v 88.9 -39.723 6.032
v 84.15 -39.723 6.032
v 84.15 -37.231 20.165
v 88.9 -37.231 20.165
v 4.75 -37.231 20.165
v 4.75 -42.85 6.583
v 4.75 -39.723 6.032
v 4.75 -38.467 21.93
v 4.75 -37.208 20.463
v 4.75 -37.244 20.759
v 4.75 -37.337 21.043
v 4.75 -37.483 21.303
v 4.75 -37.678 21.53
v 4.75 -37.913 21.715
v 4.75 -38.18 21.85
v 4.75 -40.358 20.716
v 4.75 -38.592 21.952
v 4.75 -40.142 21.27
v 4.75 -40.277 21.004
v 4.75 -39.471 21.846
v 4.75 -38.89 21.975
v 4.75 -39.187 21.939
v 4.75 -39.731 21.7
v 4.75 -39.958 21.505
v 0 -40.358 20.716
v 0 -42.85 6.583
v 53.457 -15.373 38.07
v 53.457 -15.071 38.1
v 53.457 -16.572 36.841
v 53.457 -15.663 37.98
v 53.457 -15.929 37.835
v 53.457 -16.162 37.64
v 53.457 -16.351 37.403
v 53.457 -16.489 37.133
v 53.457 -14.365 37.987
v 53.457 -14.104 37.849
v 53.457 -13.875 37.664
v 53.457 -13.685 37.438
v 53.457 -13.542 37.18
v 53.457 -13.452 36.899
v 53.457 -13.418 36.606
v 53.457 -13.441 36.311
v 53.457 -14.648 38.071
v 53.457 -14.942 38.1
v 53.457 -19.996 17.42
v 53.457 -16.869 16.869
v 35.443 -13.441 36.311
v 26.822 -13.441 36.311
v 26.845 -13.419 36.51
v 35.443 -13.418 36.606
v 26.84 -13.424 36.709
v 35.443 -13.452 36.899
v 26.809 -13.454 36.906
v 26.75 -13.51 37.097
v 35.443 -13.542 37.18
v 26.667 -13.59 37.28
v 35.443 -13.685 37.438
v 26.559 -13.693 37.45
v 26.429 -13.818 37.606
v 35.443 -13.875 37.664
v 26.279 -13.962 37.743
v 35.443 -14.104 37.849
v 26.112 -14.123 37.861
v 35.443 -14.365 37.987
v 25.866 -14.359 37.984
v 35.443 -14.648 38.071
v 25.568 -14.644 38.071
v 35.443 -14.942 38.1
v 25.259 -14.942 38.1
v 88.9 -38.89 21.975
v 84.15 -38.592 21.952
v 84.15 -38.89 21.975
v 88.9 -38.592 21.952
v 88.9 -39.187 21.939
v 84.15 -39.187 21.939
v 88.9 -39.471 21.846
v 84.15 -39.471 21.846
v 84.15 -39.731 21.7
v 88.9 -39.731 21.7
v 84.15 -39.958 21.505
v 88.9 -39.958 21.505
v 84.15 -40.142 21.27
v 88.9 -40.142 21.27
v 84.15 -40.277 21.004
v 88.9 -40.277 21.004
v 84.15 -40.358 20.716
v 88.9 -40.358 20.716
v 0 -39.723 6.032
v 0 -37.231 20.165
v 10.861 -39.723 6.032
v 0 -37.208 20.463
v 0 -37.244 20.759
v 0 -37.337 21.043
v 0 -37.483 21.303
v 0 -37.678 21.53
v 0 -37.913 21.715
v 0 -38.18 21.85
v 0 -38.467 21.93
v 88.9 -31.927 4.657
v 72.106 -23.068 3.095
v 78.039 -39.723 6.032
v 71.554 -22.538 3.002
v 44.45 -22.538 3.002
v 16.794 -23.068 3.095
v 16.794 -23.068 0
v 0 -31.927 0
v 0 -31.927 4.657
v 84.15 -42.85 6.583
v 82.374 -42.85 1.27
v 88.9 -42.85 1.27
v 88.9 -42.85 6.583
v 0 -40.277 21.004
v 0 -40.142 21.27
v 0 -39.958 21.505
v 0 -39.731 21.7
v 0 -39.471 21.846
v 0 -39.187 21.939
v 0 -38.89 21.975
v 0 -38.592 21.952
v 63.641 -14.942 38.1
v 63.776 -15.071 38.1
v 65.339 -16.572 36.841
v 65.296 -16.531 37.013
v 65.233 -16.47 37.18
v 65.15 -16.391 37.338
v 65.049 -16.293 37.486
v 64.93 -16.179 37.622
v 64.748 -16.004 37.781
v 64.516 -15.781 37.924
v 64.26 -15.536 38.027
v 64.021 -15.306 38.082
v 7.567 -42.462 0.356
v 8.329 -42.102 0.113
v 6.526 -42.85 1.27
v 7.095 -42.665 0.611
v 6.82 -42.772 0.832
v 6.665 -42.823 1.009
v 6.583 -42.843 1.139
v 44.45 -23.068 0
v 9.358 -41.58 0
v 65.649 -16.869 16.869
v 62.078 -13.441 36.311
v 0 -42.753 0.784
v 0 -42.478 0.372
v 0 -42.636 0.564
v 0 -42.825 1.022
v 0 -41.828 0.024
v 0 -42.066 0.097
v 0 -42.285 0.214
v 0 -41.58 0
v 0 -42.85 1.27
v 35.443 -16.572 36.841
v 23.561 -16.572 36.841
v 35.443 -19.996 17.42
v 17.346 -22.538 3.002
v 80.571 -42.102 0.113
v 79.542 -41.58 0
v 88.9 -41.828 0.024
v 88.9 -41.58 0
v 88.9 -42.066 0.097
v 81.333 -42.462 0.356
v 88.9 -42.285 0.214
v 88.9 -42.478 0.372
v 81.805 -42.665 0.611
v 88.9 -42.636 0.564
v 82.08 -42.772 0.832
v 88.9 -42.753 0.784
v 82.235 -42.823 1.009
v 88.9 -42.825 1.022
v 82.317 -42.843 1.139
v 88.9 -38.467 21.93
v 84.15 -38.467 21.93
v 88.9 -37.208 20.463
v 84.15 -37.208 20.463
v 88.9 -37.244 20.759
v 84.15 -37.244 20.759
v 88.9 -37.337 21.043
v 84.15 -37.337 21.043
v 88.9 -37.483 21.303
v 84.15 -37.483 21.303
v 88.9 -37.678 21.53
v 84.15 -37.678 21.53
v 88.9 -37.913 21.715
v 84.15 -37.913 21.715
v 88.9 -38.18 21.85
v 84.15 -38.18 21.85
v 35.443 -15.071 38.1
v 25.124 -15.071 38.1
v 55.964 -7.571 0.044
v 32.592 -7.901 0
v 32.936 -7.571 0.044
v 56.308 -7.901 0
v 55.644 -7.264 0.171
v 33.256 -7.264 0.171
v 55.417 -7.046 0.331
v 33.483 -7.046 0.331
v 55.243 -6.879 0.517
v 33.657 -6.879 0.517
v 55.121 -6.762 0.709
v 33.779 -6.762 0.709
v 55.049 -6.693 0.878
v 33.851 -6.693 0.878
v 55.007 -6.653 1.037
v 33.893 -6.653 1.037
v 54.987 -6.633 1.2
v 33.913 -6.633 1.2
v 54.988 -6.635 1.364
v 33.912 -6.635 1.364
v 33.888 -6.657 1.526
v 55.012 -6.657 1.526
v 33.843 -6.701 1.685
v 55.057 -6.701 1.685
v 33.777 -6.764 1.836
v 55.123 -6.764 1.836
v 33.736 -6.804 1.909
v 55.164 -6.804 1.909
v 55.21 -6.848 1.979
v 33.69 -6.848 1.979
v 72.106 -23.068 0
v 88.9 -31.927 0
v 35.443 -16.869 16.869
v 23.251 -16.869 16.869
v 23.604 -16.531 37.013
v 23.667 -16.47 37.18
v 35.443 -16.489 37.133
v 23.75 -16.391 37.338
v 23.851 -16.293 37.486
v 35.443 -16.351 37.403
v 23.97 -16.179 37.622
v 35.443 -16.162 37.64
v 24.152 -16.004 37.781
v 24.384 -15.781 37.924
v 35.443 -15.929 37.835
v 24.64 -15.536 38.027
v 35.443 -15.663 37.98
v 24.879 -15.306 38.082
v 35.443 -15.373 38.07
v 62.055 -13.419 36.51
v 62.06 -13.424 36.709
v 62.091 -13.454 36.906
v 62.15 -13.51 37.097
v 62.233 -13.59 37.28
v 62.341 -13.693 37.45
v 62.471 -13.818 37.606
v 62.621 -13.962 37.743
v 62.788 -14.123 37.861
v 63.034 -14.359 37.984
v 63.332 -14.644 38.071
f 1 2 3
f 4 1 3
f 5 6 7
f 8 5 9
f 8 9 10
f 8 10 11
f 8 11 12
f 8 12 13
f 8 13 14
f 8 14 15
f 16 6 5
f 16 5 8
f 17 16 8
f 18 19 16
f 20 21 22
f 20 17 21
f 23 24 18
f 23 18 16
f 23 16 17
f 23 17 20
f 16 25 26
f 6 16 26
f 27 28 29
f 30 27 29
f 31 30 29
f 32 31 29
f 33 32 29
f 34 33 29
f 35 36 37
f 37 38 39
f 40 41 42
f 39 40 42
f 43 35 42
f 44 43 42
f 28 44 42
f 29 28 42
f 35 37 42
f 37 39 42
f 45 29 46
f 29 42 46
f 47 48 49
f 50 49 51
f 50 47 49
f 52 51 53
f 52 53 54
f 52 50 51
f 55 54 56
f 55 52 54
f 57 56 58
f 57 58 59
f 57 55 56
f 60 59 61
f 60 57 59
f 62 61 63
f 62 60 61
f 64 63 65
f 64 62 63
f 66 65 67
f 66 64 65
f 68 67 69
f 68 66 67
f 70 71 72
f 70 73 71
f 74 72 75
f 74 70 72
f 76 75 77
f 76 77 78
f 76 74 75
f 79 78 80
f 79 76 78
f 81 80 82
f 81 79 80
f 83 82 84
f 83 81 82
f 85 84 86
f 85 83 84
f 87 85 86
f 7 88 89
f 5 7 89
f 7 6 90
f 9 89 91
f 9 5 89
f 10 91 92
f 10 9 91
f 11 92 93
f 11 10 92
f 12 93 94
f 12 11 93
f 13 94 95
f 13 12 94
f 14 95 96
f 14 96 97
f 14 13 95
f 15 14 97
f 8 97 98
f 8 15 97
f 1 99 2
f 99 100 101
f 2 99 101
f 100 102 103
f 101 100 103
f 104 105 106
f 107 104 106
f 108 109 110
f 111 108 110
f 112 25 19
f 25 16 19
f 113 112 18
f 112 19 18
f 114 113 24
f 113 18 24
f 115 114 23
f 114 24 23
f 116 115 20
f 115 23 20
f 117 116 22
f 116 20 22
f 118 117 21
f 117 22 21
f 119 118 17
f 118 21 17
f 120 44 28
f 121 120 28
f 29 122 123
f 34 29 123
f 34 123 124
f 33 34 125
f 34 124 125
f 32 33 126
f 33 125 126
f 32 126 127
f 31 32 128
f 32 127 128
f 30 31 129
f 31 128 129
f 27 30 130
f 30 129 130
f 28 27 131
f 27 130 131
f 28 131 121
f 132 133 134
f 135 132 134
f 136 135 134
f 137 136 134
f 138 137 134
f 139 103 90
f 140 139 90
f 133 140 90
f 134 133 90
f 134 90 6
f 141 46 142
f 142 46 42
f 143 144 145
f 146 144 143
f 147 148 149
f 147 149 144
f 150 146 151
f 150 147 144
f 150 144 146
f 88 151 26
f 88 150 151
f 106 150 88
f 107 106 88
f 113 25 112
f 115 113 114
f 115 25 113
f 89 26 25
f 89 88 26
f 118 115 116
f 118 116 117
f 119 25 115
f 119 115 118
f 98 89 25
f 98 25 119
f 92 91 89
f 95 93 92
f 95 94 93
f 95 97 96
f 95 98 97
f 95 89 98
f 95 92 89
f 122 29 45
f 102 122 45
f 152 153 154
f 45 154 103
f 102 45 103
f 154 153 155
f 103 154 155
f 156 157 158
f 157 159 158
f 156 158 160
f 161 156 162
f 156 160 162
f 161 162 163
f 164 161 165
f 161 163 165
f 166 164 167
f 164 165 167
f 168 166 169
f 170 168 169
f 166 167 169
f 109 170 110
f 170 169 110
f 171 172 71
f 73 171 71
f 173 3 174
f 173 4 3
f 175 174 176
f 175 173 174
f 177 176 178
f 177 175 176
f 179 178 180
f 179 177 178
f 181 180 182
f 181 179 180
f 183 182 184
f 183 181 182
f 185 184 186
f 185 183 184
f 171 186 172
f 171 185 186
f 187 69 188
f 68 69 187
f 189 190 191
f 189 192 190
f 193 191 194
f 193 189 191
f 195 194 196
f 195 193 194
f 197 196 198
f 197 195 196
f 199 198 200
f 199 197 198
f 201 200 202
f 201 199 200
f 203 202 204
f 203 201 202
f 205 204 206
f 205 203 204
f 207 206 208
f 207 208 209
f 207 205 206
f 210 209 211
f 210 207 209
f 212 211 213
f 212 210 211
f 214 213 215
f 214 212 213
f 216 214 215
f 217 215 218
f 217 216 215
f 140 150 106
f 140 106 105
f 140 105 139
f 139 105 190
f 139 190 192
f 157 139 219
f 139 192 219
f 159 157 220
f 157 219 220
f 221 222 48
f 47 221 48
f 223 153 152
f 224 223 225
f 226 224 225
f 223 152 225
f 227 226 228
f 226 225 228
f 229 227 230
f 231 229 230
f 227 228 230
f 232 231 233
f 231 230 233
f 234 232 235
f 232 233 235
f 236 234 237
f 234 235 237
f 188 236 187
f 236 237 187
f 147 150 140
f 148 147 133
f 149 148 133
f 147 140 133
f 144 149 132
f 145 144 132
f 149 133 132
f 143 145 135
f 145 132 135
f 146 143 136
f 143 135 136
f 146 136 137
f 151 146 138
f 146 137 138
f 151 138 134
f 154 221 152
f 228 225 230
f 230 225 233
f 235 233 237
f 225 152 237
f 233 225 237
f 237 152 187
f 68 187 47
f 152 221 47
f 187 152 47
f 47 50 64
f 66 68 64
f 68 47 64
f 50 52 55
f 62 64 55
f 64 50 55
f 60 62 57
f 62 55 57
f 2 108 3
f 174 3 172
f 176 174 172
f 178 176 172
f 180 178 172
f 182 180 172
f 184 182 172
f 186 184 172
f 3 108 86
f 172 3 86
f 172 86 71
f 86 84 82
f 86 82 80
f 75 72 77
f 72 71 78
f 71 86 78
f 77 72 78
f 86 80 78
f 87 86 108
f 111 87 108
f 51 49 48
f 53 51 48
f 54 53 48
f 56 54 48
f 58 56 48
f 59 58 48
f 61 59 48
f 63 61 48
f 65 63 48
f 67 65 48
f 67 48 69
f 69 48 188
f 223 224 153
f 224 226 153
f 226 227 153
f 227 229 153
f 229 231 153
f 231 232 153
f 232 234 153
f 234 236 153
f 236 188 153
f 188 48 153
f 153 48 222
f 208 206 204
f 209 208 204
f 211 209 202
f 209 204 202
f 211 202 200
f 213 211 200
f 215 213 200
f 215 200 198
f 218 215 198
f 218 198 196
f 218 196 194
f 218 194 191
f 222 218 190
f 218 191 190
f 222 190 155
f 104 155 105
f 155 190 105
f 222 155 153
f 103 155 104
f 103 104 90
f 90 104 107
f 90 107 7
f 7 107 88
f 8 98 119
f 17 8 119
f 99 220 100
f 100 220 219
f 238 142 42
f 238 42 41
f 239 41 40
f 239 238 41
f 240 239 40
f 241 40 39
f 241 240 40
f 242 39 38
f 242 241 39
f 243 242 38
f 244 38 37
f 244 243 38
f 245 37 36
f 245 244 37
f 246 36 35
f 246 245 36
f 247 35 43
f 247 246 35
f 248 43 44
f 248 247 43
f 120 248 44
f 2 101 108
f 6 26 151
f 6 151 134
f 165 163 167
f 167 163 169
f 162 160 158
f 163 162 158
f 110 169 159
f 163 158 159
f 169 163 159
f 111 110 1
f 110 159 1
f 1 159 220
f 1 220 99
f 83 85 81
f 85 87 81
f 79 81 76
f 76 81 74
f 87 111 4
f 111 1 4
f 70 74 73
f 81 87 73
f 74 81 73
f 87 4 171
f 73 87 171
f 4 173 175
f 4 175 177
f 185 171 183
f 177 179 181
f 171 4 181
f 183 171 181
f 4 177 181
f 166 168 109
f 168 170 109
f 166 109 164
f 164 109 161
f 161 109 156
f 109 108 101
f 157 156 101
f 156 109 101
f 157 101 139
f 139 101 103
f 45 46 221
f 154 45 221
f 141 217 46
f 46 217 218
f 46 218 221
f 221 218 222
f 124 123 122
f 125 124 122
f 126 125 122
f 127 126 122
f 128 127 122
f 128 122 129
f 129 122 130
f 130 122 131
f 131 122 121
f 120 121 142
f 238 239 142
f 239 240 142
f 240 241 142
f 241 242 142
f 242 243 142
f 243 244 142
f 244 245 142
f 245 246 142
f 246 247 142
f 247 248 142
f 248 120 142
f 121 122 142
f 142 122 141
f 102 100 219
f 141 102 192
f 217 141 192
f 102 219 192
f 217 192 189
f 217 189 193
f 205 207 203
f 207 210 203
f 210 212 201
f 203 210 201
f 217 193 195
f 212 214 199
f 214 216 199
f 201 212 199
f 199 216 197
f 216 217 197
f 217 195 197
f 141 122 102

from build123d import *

# Parameters (mm, degrees)
F0_W      = 88.9
F0_H      = 38.1
F1_DEPTH  = 42.8498
F3_DEPTH  = 127
F4_W      = 79.4004
F4_H      = 15.875
F5_DEPTH  = 6.35
F7_DEPTH  = 25.4
F9_DEPTH  = 127
F10_R     = 1.524
F12_DEPTH = 25.4
F13_R     = 1.27
F14_W     = 18.0139442934
F14_H     = 19.7421588048
F14_H_2   = 6.130434971
F15_DEPTH = 25.4


with BuildPart() as f1:
    # F0 (on Front) → F1 (new body)
    with BuildSketch(Plane.XZ):
        with Locations((44.45, 19.05)):
            Rectangle(F0_W, F0_H)
    extrude(amount=F1_DEPTH)

    # F2 (on face) → F3 (cut)
    with BuildSketch(Plane(origin=(0, 0, 0), x_dir=(0, -1, 0), z_dir=(-1, 0, 0))):
        Polygon((16.8691291251, 16.8691291251), (13.1255537659, 38.1), (0, 38.1), (0, 0), (5.515703716, 0), align=None)
        Polygon((16.3495332586, 38.1), (22.5383370557, 3.0015495405), (39.7230353842, 6.0316755111), (36.9663705637, 21.6654985902), (40.0931351795, 22.2168315543), (42.8498, 6.5830084752), (42.8498, 38.1), align=None)
    extrude(amount=-F3_DEPTH, mode=Mode.SUBTRACT)

    # F4 (on face) → F5 (cut)
    with BuildSketch(Plane(origin=(0, -42.6834811822, 7.526249363), x_dir=(1, 0, 0), z_dir=(0, -0.984807753, 0.1736481777))):
        with Locations((44.45, 6.9797081012)):
            Rectangle(F4_W, F4_H)
    extrude(amount=-F5_DEPTH, mode=Mode.SUBTRACT)

    # F6 (on face) → F7 (cut)
    with BuildSketch(Plane(origin=(0, -0.1663188178, -0.9432408877), x_dir=(1, 0, 0), z_dir=(0, 0.1736481777, 0.984807753))):
        Polygon((16.7943580049, -22.7171426803), (0, -22.7171426803), (0, -31.4420426803), align=None)
        Polygon((84.1502, -43.3419426803), (44.45, -22.7171426803), (4.7498, -43.3419426803), align=None)
        Polygon((88.9, -22.7171426803), (72.1056419951, -22.7171426803), (88.9, -31.4420426803), align=None)
    extrude(amount=-F7_DEPTH, mode=Mode.SUBTRACT)

    # F8 (on face) → F9 (cut)
    with BuildSketch(Plane(origin=(0, 0, 0), x_dir=(1, 0, 0), z_dir=(0, 0, -1))):
        Polygon((35.0774, 5.515703716), (16.7943580049, 23.0675912236), (0, 23.0675912236), (0, 5.515703716), align=None)
        Polygon((72.1056419951, 23.0675912236), (53.8226, 5.515703716), (88.9, 5.515703716), (88.9, 23.0675912236), align=None)
    extrude(amount=-F9_DEPTH, mode=Mode.SUBTRACT)

    # F10
    f10_edges = [f1.edges().sort_by_distance(p)[0] for p in [
        (44.45, -13.125554, 38.1),
        (44.45, -16.349533, 38.1),
        (2.3749, -36.966371, 21.665499),
        (2.3749, -40.093135, 22.216832),
        (86.5251, -36.966371, 21.665499),
        (86.5251, -40.093135, 22.216832),
    ]]
    fillet(f10_edges, radius=F10_R)

    # F11 (on face) → F12 (cut)
    with BuildSketch(Plane(origin=(0, 0, 0), x_dir=(1, 0, 0), z_dir=(0, 0, -1))):
        Polygon((16.7943580049, 23.0675912236), (0, 31.9270868696), (0, 30.7840723544), (16.1012234683, 21.7536620769), align=None)
        Polygon((88.9, 31.9270868696), (72.1056419951, 23.0675912236), (72.6024817226, 22.125765121), (88.9, 30.4145570844), align=None)
    extrude(amount=-F12_DEPTH, mode=Mode.SUBTRACT)

    # F13
    f13_edges = [f1.edges().sort_by_distance(p)[0] for p in [
        (44.45, -5.515704, 0),
        (85.42491, -42.8498, 0),
        (3.47509, -42.8498, 0),
    ]]
    fillet(f13_edges, radius=F13_R)

    # F14 (on face) → F15 (cut)
    with BuildSketch(Plane(origin=(0, -19.245253622, 3.3934574641), x_dir=(-1, 0, 0), z_dir=(0, 0.984807753, -0.1736481777))):
        with Locations((-44.45, 23.5546350199)):
            Rectangle(F14_W, F14_H)
        with Locations((-44.45, 36.4909319078)):
            Rectangle(F14_W, F14_H_2)
    extrude(amount=-F15_DEPTH, mode=Mode.SUBTRACT)


solid = f1.part
